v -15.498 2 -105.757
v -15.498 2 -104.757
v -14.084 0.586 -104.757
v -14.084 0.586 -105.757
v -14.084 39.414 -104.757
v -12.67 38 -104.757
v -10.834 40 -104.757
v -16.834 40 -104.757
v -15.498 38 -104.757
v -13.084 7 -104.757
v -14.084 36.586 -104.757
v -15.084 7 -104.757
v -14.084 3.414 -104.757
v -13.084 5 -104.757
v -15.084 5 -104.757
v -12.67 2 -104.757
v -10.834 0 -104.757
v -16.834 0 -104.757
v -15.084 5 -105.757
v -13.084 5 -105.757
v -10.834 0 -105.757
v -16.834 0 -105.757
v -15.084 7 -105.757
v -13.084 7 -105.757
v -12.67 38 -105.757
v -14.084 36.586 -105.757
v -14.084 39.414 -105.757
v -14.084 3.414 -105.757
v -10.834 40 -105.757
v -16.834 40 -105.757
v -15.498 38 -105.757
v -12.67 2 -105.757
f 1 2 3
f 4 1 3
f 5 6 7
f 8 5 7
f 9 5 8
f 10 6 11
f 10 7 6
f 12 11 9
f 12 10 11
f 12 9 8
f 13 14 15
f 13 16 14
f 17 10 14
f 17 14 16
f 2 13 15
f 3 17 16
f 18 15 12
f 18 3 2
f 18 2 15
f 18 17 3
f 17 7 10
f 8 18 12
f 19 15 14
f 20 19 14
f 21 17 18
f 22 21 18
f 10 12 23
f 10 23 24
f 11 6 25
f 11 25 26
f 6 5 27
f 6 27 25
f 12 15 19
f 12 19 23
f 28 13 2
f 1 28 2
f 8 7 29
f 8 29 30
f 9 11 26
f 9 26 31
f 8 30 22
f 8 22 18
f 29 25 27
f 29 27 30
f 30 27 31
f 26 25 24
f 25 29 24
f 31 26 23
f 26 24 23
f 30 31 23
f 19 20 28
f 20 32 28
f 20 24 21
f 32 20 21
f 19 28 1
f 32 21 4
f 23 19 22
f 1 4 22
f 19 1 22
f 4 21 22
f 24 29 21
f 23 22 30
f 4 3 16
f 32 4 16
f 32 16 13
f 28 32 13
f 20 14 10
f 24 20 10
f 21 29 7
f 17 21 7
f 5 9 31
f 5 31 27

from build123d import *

# Parameters (mm, degrees)
PROFILE_SKETCH_W               = 6
PROFILE_SKETCH_H               = 1
PROFILE_EXTRUDE_DEPTH          = 40
FIDUCIAL_CUT_DEPTH             = 44.409509652
FIDUCIAL_1_INDICATOR_SKETCH_W  = 2
FIDUCIAL_1_INDICATOR_SKETCH_H  = 2
FIDUCIAL_1_INDICATOR_CUT_DEPTH = 44.409509652


with BuildPart() as part:
    # Profile Sketch → Profile Extrude (new body)
    with BuildSketch(Plane(origin=(-13.83405858, 0, -105.75669297), x_dir=(-1, 0, 0), z_dir=(0, 1, 0))):
        with Locations((0, 0.5)):
            Rectangle(PROFILE_SKETCH_W, PROFILE_SKETCH_H)
    extrude(amount=PROFILE_EXTRUDE_DEPTH)

    # Fiducial Sketch → Fiducial Cut (cut, through all)
    with BuildSketch(Plane.XY.offset(-104.75669297)):
        Polygon((-12.669845017, 2), (-14.08405858, 3.414213562), (-15.498272142, 2), (-14.08405858, 0.585786438), align=None)
    fiducial_cut = extrude(amount=-FIDUCIAL_CUT_DEPTH, mode=Mode.SUBTRACT)

    # Fiducial Mirror: Fiducial Cut across plane
    add(fiducial_cut.mirror(Plane(origin=(0, 20, 0), x_dir=(0, 0, 1), z_dir=(0, -1, 0))), mode=Mode.SUBTRACT)

    # Fiducial 1 Indicator Sketch → Fiducial 1 Indicator Cut (cut, through all)
    with BuildSketch(Plane.XY.offset(-104.75669297)):
        with Locations((-14.08405858, 6)):
            Rectangle(FIDUCIAL_1_INDICATOR_SKETCH_W, FIDUCIAL_1_INDICATOR_SKETCH_H)
    extrude(amount=-FIDUCIAL_1_INDICATOR_CUT_DEPTH, mode=Mode.SUBTRACT)


solid = part.part
